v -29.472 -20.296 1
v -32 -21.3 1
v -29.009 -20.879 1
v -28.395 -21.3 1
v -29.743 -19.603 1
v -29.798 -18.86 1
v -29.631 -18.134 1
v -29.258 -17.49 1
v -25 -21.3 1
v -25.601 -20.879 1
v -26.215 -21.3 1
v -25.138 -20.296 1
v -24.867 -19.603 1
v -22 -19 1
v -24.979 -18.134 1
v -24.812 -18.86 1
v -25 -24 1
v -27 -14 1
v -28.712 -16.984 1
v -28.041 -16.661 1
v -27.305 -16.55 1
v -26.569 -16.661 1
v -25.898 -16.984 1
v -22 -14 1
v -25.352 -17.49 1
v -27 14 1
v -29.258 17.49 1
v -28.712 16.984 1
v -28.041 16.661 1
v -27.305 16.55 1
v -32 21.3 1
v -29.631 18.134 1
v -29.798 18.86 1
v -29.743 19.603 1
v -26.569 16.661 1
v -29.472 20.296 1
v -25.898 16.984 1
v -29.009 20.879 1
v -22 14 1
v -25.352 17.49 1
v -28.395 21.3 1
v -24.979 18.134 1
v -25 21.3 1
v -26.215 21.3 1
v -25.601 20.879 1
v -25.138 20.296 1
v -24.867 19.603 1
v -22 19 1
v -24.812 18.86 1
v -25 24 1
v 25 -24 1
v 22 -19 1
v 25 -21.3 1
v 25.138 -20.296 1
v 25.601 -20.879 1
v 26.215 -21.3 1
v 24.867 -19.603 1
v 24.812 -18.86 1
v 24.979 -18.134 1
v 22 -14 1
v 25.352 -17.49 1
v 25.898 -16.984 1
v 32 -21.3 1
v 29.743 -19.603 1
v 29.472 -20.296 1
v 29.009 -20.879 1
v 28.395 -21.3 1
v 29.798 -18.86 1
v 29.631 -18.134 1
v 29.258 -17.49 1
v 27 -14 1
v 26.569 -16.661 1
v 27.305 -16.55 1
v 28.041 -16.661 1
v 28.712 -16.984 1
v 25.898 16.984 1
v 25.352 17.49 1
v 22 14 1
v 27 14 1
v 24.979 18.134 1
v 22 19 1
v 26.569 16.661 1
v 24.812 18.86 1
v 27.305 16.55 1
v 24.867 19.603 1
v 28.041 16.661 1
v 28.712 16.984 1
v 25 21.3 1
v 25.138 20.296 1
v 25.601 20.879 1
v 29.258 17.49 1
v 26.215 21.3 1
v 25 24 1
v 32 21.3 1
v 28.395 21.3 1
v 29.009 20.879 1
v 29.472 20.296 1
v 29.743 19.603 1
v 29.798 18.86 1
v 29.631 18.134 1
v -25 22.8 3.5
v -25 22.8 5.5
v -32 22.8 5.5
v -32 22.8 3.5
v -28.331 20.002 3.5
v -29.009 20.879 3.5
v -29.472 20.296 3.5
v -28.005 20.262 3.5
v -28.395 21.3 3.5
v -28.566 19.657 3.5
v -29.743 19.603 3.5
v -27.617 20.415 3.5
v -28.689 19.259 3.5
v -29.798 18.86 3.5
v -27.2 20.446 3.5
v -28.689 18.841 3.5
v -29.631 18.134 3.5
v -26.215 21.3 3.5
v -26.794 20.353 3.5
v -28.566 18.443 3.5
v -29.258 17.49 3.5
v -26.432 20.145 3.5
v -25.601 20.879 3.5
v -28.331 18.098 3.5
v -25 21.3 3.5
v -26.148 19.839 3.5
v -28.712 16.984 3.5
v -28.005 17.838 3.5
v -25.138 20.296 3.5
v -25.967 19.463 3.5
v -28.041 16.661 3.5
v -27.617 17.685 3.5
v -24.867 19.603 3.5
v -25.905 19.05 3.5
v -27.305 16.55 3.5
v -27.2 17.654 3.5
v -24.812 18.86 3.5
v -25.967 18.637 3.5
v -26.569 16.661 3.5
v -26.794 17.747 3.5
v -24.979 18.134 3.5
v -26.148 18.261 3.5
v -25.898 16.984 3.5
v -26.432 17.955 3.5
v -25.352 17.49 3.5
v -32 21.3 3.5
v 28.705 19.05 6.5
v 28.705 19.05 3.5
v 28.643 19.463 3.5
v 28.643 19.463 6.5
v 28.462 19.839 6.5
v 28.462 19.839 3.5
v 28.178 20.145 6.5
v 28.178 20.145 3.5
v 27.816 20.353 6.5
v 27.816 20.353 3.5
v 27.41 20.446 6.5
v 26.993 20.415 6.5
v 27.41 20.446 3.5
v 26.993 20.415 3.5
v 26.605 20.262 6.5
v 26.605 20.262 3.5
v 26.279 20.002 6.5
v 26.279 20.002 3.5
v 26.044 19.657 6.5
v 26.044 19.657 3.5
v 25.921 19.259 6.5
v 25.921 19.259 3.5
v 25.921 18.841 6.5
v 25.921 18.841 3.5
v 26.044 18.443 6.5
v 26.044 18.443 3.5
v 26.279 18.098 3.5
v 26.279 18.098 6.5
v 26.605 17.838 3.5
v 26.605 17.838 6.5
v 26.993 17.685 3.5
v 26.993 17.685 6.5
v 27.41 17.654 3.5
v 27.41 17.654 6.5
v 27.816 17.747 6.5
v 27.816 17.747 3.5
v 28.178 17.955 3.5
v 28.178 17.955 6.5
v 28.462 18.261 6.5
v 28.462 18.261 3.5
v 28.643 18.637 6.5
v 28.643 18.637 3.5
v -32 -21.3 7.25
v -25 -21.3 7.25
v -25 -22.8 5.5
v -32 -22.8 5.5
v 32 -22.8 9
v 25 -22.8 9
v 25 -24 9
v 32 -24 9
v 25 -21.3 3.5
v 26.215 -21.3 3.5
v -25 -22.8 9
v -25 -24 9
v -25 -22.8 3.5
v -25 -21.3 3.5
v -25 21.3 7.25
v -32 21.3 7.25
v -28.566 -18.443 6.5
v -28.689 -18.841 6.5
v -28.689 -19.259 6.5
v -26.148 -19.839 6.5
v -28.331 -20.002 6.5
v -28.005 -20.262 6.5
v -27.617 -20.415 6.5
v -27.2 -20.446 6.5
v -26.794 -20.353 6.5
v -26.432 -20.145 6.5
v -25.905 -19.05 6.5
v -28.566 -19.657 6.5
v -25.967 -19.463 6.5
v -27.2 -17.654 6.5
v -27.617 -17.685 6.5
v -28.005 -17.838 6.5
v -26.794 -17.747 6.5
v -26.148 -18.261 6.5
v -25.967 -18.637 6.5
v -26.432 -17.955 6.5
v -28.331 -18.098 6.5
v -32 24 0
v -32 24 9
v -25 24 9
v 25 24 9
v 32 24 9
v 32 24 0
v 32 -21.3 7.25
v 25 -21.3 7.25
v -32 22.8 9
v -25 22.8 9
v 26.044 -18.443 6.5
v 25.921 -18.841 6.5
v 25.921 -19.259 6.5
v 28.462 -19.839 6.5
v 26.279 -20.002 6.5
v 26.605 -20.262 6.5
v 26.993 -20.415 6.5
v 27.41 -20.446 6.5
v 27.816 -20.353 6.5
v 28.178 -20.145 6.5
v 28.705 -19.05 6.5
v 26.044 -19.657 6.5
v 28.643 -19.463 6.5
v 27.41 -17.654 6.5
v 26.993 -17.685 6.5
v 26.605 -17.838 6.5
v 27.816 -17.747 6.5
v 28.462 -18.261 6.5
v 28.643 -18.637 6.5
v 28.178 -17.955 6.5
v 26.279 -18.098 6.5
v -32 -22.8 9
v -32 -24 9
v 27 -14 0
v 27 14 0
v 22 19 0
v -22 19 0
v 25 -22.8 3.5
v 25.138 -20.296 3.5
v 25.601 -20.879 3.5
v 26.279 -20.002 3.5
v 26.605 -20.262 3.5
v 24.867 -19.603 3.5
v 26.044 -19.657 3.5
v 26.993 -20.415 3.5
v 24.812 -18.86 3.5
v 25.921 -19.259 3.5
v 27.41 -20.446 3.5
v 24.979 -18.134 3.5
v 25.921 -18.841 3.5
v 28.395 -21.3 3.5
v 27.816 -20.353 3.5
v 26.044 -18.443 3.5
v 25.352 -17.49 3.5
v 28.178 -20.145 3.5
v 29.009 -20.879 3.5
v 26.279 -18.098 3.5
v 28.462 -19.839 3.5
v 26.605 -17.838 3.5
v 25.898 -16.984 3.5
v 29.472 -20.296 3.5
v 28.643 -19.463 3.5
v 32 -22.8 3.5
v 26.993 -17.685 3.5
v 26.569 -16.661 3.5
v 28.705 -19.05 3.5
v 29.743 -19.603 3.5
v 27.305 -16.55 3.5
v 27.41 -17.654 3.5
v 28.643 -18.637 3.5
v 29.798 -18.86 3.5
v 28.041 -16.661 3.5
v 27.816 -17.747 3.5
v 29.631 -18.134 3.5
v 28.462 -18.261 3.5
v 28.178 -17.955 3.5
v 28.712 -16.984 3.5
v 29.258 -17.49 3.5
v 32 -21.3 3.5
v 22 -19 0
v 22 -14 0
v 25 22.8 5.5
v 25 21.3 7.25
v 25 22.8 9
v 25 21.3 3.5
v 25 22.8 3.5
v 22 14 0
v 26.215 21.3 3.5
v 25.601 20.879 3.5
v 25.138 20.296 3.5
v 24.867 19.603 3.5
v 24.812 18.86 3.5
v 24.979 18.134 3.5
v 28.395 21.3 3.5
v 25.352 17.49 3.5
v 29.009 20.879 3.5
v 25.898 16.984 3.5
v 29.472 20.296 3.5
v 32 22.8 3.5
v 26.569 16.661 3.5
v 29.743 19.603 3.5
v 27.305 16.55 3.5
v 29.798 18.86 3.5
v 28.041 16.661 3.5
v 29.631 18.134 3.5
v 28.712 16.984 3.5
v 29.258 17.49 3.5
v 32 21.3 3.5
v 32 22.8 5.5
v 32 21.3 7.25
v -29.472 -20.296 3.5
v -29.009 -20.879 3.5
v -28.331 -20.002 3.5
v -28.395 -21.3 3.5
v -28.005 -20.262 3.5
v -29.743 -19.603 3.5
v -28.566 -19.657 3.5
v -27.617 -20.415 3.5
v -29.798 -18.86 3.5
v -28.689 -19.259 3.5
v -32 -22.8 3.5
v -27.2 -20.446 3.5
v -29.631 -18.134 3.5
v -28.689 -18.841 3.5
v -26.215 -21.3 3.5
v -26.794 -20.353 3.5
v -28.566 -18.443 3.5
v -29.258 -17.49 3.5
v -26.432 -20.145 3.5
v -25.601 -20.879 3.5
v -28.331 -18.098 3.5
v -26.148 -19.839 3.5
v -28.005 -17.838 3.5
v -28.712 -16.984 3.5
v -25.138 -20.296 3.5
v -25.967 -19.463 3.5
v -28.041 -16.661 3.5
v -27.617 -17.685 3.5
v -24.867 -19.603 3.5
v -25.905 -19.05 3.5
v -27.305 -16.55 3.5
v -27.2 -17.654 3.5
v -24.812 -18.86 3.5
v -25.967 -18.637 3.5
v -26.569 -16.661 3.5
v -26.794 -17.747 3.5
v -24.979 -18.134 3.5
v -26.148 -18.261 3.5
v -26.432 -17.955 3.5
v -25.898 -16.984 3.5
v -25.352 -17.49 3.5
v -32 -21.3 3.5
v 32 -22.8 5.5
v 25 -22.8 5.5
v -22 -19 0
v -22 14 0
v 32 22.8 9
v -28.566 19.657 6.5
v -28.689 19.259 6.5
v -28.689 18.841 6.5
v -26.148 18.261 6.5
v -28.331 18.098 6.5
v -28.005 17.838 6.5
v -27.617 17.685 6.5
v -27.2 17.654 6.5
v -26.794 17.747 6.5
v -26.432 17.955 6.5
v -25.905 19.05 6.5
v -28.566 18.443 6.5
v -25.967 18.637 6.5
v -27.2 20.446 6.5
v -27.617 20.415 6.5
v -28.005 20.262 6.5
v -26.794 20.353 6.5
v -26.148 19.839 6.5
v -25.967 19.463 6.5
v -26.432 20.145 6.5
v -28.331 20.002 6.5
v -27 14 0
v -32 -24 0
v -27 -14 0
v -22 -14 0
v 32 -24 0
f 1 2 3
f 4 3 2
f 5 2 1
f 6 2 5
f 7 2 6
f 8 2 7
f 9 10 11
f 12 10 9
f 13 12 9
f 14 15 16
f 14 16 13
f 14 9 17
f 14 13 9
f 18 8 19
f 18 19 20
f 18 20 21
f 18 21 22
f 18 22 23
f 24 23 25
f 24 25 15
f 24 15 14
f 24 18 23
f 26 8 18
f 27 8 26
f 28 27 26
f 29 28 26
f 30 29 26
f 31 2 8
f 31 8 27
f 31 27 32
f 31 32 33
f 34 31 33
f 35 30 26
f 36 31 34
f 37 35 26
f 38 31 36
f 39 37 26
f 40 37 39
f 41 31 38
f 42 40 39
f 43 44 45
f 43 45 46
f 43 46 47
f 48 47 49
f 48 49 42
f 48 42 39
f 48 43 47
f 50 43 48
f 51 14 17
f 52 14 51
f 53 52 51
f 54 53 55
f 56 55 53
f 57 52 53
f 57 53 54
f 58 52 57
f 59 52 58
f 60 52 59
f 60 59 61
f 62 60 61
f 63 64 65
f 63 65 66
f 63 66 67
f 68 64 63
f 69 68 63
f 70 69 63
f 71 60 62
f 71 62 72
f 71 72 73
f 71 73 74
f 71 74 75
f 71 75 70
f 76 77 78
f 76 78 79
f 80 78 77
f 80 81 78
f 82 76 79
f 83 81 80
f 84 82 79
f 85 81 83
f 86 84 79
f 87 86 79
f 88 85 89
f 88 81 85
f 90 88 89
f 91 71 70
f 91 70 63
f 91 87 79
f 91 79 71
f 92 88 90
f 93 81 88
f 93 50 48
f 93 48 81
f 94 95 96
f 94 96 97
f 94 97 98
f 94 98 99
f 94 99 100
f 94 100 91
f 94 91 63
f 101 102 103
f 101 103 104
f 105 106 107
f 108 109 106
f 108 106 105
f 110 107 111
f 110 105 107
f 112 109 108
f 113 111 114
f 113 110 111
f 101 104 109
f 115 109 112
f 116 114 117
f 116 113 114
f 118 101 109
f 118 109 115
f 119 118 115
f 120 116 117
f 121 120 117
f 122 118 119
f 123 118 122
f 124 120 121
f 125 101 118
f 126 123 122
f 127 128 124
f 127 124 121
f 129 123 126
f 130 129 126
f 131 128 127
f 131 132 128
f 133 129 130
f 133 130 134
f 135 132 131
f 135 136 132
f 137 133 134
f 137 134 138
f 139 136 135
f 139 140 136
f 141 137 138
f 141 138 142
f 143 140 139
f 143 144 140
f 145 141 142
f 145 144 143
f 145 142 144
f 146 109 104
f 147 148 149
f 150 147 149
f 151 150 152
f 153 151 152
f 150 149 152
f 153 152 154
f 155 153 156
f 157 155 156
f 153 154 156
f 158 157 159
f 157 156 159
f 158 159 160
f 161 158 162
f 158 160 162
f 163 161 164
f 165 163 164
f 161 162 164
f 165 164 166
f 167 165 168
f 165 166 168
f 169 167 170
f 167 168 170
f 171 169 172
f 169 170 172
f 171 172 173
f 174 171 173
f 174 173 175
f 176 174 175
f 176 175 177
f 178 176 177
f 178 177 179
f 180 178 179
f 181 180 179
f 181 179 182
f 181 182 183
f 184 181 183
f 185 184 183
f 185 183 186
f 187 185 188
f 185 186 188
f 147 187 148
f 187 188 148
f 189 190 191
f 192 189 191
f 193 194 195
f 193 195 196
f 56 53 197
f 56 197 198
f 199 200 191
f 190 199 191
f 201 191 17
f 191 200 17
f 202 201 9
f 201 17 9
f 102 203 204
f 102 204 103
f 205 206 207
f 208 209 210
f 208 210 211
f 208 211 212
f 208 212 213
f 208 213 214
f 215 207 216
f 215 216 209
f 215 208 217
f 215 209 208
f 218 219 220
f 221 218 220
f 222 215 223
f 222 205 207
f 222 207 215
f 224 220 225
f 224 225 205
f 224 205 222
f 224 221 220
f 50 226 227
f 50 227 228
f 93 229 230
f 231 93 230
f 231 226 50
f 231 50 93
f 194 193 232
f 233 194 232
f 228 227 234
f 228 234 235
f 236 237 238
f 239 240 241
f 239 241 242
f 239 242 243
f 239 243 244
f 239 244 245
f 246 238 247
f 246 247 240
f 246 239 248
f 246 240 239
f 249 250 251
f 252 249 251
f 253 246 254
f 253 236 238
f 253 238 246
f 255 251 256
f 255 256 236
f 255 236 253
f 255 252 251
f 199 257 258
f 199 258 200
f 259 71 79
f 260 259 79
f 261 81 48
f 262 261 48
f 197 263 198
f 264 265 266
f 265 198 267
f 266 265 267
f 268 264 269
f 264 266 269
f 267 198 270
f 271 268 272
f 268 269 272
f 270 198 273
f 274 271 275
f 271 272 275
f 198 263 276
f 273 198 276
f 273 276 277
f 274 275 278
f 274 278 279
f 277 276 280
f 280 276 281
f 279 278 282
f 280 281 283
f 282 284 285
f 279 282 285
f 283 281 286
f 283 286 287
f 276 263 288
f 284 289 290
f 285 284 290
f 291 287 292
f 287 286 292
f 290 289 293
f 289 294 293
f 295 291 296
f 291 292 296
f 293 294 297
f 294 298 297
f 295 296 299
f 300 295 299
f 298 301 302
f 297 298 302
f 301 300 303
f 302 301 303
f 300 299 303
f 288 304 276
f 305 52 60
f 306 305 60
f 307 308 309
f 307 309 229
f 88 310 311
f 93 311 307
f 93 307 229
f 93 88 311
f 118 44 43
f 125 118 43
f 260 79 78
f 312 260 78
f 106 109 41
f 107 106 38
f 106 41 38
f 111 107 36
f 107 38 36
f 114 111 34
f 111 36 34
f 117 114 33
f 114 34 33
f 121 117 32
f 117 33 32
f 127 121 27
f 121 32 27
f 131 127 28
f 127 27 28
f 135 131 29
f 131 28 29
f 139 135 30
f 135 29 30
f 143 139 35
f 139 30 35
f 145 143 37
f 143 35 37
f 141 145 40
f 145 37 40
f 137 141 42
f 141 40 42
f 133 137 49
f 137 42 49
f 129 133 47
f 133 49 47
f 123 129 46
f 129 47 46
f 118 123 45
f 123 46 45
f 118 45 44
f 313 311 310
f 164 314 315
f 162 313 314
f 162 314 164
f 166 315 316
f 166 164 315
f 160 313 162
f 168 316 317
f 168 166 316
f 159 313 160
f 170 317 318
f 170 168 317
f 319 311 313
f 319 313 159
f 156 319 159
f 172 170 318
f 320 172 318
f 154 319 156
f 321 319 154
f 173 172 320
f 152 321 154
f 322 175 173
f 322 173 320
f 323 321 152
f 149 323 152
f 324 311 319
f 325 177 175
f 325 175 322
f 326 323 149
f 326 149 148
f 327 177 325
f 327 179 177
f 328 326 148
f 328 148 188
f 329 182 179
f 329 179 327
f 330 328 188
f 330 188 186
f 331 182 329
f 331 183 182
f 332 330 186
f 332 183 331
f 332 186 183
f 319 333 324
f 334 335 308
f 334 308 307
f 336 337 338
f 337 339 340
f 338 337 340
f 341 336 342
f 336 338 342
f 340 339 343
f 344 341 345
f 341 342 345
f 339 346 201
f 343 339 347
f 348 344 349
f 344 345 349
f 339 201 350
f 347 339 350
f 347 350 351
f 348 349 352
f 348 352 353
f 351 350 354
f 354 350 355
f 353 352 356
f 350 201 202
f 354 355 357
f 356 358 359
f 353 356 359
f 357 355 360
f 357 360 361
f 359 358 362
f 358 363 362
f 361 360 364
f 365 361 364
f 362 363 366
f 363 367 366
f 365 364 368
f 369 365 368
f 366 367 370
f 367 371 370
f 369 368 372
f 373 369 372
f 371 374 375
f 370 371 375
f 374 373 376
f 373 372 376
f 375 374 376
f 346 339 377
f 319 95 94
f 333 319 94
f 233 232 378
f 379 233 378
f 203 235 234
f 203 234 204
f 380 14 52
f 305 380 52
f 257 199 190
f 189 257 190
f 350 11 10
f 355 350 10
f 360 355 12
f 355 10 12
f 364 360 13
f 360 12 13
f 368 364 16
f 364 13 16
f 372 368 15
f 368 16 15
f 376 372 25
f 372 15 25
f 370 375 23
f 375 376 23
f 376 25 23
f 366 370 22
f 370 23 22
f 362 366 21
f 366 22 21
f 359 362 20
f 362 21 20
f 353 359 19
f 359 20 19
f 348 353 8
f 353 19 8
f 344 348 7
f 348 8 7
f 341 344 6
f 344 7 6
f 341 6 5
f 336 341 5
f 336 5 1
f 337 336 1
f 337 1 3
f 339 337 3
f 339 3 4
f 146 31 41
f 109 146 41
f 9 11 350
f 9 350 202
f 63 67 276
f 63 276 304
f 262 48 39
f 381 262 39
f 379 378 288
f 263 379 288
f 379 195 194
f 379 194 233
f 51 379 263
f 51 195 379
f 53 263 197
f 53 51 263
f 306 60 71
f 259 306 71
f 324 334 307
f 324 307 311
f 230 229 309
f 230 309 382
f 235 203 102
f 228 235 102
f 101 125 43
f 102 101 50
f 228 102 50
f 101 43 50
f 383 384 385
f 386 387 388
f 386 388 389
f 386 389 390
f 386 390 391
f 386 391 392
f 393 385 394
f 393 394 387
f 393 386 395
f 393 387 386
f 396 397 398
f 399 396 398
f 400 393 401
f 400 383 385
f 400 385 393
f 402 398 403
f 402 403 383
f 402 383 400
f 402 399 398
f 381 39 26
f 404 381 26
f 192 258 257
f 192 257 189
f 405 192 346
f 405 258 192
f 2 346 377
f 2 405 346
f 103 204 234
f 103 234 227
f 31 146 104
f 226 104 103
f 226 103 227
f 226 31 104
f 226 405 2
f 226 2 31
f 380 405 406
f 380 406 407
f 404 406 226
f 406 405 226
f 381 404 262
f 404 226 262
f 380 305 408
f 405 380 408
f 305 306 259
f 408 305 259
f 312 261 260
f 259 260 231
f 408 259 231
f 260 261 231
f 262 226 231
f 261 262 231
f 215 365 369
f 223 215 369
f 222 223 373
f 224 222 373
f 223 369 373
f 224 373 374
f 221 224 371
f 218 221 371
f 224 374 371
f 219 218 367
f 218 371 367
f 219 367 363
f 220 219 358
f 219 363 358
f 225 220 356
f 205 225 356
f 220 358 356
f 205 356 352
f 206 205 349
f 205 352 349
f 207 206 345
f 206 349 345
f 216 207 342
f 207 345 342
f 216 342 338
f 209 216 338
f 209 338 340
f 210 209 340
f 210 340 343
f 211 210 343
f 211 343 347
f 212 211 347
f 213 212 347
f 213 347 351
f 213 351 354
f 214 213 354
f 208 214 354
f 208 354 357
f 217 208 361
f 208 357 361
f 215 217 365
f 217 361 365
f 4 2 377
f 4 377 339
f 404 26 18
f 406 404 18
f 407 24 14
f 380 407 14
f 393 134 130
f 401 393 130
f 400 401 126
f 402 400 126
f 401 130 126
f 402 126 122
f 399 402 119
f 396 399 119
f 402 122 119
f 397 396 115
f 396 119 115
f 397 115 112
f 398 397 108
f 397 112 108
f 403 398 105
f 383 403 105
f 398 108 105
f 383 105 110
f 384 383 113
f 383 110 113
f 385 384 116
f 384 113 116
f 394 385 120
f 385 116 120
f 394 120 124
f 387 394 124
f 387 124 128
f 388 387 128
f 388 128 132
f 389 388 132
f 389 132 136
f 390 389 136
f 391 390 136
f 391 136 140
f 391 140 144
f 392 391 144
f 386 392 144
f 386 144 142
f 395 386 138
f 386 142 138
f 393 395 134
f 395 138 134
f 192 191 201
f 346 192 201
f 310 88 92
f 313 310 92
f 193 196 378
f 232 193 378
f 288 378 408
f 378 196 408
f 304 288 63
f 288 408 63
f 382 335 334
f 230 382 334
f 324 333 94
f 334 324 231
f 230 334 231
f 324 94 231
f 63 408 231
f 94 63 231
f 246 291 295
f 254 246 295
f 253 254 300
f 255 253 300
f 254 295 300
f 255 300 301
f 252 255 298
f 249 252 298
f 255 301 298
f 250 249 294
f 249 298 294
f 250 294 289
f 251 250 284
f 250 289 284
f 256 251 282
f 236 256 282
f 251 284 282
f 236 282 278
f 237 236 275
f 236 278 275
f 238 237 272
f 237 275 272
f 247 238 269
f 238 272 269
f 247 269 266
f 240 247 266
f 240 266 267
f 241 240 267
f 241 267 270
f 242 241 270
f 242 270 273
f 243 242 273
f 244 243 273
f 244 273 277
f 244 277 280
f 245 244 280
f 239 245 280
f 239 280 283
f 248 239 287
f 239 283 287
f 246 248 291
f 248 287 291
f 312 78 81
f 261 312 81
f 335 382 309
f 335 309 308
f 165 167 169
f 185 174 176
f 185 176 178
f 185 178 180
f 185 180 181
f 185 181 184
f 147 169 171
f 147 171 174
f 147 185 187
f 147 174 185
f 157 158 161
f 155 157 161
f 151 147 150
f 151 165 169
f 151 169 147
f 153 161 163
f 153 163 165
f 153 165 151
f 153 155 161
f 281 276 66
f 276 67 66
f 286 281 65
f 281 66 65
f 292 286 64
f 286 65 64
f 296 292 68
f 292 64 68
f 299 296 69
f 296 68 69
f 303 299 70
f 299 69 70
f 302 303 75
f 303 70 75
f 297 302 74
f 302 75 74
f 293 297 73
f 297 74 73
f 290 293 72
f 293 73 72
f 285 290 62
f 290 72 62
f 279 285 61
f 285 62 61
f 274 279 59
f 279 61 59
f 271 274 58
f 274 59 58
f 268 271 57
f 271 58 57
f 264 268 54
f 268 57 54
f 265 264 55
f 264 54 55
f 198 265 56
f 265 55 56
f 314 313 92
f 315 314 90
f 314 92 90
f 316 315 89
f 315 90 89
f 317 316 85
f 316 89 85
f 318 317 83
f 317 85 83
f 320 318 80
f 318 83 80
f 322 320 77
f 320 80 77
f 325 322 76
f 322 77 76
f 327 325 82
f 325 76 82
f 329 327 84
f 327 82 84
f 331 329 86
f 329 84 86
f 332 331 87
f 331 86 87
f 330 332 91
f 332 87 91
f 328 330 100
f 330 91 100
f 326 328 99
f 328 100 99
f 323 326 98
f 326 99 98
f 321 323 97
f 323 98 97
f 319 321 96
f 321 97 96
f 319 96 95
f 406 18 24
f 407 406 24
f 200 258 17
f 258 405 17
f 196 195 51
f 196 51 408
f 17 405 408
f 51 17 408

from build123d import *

# Parameters (mm, degrees)
SKETCH_W        = 64
SKETCH_H        = 48
PAD_DEPTH       = 1
POCKET_DEPTH    = 1.001
SKETCH002_R     = 2.5
PAD001_DEPTH    = 2.5
SKETCH003_R     = 1.4
PAD002_DEPTH    = 3
SKETCH004_W     = 7
SKETCH004_H     = 2.7
PAD003_DEPTH    = 8
POCKET001_DEPTH = 225.010317


with BuildPart() as part:
    # Sketch → Pad (new body)
    with BuildSketch(Plane.XY):
        Rectangle(SKETCH_W, SKETCH_H)
    extrude(amount=PAD_DEPTH)

    # Sketch001 → Pocket (cut, through all)
    with BuildSketch(Plane.XY.offset(1)):
        Polygon((-27, 14), (-27, -14), (-22, -14), (-22, -19), (22, -19), (22, -14), (27, -14), (27, 14), (22, 14), (22, 19), (-22, 19), (-22, 14), align=None)
    extrude(amount=-POCKET_DEPTH, mode=Mode.SUBTRACT)

    # Sketch002 → Pad001 (new body)
    with BuildSketch(Plane.XY.offset(1)):
        with Locations((-27.305, 19.05)):
            Circle(SKETCH002_R)
        with Locations((-27.305, -19.05)):
            Circle(SKETCH002_R)
        with Locations((27.305, 19.05)):
            Circle(SKETCH002_R)
        with Locations((27.305, -19.05)):
            Circle(SKETCH002_R)
    extrude(amount=PAD001_DEPTH)

    # Sketch003 → Pad002 (new body)
    with BuildSketch(Plane.XY.offset(3.5)):
        with Locations((27.305, 19.05)):
            Circle(SKETCH003_R)
        with Locations((-27.305, -19.05)):
            Circle(SKETCH003_R)
        with Locations((27.305, -19.05)):
            Circle(SKETCH003_R)
        with Locations((-27.305, 19.05)):
            Circle(SKETCH003_R)
    extrude(amount=PAD002_DEPTH)

    # Sketch004 → Pad003 (new body)
    with BuildSketch(Plane.XY.offset(1)):
        with Locations((-28.5, -22.65)):
            Rectangle(SKETCH004_W, SKETCH004_H)
        with Locations((28.5, -22.65)):
            Rectangle(SKETCH004_W, SKETCH004_H)
        with Locations((28.5, 22.65)):
            Rectangle(SKETCH004_W, SKETCH004_H)
        with Locations((-28.5, 22.65)):
            Rectangle(SKETCH004_W, SKETCH004_H)
    extrude(amount=PAD003_DEPTH)

    # Sketch005 → Pocket001 (cut, through all)
    with BuildSketch(Plane.YZ.offset(32)):
        Polygon((-22.8, 9), (-21.3, 7.25), (-22.8, 5.5), (-22.8, 3.5), (-21.3, 3.5), (-21.2, 10), (-22.8, 10), align=None)
    pocket001 = extrude(amount=-POCKET001_DEPTH, mode=Mode.SUBTRACT)

    # Mirrored: Pocket001 across Sketch005 V_Axis
    add(pocket001.mirror(Plane(origin=(32, 0, 0), x_dir=(1, 0, 0), z_dir=(0, 1, 0))), mode=Mode.SUBTRACT)


solid = part.part
